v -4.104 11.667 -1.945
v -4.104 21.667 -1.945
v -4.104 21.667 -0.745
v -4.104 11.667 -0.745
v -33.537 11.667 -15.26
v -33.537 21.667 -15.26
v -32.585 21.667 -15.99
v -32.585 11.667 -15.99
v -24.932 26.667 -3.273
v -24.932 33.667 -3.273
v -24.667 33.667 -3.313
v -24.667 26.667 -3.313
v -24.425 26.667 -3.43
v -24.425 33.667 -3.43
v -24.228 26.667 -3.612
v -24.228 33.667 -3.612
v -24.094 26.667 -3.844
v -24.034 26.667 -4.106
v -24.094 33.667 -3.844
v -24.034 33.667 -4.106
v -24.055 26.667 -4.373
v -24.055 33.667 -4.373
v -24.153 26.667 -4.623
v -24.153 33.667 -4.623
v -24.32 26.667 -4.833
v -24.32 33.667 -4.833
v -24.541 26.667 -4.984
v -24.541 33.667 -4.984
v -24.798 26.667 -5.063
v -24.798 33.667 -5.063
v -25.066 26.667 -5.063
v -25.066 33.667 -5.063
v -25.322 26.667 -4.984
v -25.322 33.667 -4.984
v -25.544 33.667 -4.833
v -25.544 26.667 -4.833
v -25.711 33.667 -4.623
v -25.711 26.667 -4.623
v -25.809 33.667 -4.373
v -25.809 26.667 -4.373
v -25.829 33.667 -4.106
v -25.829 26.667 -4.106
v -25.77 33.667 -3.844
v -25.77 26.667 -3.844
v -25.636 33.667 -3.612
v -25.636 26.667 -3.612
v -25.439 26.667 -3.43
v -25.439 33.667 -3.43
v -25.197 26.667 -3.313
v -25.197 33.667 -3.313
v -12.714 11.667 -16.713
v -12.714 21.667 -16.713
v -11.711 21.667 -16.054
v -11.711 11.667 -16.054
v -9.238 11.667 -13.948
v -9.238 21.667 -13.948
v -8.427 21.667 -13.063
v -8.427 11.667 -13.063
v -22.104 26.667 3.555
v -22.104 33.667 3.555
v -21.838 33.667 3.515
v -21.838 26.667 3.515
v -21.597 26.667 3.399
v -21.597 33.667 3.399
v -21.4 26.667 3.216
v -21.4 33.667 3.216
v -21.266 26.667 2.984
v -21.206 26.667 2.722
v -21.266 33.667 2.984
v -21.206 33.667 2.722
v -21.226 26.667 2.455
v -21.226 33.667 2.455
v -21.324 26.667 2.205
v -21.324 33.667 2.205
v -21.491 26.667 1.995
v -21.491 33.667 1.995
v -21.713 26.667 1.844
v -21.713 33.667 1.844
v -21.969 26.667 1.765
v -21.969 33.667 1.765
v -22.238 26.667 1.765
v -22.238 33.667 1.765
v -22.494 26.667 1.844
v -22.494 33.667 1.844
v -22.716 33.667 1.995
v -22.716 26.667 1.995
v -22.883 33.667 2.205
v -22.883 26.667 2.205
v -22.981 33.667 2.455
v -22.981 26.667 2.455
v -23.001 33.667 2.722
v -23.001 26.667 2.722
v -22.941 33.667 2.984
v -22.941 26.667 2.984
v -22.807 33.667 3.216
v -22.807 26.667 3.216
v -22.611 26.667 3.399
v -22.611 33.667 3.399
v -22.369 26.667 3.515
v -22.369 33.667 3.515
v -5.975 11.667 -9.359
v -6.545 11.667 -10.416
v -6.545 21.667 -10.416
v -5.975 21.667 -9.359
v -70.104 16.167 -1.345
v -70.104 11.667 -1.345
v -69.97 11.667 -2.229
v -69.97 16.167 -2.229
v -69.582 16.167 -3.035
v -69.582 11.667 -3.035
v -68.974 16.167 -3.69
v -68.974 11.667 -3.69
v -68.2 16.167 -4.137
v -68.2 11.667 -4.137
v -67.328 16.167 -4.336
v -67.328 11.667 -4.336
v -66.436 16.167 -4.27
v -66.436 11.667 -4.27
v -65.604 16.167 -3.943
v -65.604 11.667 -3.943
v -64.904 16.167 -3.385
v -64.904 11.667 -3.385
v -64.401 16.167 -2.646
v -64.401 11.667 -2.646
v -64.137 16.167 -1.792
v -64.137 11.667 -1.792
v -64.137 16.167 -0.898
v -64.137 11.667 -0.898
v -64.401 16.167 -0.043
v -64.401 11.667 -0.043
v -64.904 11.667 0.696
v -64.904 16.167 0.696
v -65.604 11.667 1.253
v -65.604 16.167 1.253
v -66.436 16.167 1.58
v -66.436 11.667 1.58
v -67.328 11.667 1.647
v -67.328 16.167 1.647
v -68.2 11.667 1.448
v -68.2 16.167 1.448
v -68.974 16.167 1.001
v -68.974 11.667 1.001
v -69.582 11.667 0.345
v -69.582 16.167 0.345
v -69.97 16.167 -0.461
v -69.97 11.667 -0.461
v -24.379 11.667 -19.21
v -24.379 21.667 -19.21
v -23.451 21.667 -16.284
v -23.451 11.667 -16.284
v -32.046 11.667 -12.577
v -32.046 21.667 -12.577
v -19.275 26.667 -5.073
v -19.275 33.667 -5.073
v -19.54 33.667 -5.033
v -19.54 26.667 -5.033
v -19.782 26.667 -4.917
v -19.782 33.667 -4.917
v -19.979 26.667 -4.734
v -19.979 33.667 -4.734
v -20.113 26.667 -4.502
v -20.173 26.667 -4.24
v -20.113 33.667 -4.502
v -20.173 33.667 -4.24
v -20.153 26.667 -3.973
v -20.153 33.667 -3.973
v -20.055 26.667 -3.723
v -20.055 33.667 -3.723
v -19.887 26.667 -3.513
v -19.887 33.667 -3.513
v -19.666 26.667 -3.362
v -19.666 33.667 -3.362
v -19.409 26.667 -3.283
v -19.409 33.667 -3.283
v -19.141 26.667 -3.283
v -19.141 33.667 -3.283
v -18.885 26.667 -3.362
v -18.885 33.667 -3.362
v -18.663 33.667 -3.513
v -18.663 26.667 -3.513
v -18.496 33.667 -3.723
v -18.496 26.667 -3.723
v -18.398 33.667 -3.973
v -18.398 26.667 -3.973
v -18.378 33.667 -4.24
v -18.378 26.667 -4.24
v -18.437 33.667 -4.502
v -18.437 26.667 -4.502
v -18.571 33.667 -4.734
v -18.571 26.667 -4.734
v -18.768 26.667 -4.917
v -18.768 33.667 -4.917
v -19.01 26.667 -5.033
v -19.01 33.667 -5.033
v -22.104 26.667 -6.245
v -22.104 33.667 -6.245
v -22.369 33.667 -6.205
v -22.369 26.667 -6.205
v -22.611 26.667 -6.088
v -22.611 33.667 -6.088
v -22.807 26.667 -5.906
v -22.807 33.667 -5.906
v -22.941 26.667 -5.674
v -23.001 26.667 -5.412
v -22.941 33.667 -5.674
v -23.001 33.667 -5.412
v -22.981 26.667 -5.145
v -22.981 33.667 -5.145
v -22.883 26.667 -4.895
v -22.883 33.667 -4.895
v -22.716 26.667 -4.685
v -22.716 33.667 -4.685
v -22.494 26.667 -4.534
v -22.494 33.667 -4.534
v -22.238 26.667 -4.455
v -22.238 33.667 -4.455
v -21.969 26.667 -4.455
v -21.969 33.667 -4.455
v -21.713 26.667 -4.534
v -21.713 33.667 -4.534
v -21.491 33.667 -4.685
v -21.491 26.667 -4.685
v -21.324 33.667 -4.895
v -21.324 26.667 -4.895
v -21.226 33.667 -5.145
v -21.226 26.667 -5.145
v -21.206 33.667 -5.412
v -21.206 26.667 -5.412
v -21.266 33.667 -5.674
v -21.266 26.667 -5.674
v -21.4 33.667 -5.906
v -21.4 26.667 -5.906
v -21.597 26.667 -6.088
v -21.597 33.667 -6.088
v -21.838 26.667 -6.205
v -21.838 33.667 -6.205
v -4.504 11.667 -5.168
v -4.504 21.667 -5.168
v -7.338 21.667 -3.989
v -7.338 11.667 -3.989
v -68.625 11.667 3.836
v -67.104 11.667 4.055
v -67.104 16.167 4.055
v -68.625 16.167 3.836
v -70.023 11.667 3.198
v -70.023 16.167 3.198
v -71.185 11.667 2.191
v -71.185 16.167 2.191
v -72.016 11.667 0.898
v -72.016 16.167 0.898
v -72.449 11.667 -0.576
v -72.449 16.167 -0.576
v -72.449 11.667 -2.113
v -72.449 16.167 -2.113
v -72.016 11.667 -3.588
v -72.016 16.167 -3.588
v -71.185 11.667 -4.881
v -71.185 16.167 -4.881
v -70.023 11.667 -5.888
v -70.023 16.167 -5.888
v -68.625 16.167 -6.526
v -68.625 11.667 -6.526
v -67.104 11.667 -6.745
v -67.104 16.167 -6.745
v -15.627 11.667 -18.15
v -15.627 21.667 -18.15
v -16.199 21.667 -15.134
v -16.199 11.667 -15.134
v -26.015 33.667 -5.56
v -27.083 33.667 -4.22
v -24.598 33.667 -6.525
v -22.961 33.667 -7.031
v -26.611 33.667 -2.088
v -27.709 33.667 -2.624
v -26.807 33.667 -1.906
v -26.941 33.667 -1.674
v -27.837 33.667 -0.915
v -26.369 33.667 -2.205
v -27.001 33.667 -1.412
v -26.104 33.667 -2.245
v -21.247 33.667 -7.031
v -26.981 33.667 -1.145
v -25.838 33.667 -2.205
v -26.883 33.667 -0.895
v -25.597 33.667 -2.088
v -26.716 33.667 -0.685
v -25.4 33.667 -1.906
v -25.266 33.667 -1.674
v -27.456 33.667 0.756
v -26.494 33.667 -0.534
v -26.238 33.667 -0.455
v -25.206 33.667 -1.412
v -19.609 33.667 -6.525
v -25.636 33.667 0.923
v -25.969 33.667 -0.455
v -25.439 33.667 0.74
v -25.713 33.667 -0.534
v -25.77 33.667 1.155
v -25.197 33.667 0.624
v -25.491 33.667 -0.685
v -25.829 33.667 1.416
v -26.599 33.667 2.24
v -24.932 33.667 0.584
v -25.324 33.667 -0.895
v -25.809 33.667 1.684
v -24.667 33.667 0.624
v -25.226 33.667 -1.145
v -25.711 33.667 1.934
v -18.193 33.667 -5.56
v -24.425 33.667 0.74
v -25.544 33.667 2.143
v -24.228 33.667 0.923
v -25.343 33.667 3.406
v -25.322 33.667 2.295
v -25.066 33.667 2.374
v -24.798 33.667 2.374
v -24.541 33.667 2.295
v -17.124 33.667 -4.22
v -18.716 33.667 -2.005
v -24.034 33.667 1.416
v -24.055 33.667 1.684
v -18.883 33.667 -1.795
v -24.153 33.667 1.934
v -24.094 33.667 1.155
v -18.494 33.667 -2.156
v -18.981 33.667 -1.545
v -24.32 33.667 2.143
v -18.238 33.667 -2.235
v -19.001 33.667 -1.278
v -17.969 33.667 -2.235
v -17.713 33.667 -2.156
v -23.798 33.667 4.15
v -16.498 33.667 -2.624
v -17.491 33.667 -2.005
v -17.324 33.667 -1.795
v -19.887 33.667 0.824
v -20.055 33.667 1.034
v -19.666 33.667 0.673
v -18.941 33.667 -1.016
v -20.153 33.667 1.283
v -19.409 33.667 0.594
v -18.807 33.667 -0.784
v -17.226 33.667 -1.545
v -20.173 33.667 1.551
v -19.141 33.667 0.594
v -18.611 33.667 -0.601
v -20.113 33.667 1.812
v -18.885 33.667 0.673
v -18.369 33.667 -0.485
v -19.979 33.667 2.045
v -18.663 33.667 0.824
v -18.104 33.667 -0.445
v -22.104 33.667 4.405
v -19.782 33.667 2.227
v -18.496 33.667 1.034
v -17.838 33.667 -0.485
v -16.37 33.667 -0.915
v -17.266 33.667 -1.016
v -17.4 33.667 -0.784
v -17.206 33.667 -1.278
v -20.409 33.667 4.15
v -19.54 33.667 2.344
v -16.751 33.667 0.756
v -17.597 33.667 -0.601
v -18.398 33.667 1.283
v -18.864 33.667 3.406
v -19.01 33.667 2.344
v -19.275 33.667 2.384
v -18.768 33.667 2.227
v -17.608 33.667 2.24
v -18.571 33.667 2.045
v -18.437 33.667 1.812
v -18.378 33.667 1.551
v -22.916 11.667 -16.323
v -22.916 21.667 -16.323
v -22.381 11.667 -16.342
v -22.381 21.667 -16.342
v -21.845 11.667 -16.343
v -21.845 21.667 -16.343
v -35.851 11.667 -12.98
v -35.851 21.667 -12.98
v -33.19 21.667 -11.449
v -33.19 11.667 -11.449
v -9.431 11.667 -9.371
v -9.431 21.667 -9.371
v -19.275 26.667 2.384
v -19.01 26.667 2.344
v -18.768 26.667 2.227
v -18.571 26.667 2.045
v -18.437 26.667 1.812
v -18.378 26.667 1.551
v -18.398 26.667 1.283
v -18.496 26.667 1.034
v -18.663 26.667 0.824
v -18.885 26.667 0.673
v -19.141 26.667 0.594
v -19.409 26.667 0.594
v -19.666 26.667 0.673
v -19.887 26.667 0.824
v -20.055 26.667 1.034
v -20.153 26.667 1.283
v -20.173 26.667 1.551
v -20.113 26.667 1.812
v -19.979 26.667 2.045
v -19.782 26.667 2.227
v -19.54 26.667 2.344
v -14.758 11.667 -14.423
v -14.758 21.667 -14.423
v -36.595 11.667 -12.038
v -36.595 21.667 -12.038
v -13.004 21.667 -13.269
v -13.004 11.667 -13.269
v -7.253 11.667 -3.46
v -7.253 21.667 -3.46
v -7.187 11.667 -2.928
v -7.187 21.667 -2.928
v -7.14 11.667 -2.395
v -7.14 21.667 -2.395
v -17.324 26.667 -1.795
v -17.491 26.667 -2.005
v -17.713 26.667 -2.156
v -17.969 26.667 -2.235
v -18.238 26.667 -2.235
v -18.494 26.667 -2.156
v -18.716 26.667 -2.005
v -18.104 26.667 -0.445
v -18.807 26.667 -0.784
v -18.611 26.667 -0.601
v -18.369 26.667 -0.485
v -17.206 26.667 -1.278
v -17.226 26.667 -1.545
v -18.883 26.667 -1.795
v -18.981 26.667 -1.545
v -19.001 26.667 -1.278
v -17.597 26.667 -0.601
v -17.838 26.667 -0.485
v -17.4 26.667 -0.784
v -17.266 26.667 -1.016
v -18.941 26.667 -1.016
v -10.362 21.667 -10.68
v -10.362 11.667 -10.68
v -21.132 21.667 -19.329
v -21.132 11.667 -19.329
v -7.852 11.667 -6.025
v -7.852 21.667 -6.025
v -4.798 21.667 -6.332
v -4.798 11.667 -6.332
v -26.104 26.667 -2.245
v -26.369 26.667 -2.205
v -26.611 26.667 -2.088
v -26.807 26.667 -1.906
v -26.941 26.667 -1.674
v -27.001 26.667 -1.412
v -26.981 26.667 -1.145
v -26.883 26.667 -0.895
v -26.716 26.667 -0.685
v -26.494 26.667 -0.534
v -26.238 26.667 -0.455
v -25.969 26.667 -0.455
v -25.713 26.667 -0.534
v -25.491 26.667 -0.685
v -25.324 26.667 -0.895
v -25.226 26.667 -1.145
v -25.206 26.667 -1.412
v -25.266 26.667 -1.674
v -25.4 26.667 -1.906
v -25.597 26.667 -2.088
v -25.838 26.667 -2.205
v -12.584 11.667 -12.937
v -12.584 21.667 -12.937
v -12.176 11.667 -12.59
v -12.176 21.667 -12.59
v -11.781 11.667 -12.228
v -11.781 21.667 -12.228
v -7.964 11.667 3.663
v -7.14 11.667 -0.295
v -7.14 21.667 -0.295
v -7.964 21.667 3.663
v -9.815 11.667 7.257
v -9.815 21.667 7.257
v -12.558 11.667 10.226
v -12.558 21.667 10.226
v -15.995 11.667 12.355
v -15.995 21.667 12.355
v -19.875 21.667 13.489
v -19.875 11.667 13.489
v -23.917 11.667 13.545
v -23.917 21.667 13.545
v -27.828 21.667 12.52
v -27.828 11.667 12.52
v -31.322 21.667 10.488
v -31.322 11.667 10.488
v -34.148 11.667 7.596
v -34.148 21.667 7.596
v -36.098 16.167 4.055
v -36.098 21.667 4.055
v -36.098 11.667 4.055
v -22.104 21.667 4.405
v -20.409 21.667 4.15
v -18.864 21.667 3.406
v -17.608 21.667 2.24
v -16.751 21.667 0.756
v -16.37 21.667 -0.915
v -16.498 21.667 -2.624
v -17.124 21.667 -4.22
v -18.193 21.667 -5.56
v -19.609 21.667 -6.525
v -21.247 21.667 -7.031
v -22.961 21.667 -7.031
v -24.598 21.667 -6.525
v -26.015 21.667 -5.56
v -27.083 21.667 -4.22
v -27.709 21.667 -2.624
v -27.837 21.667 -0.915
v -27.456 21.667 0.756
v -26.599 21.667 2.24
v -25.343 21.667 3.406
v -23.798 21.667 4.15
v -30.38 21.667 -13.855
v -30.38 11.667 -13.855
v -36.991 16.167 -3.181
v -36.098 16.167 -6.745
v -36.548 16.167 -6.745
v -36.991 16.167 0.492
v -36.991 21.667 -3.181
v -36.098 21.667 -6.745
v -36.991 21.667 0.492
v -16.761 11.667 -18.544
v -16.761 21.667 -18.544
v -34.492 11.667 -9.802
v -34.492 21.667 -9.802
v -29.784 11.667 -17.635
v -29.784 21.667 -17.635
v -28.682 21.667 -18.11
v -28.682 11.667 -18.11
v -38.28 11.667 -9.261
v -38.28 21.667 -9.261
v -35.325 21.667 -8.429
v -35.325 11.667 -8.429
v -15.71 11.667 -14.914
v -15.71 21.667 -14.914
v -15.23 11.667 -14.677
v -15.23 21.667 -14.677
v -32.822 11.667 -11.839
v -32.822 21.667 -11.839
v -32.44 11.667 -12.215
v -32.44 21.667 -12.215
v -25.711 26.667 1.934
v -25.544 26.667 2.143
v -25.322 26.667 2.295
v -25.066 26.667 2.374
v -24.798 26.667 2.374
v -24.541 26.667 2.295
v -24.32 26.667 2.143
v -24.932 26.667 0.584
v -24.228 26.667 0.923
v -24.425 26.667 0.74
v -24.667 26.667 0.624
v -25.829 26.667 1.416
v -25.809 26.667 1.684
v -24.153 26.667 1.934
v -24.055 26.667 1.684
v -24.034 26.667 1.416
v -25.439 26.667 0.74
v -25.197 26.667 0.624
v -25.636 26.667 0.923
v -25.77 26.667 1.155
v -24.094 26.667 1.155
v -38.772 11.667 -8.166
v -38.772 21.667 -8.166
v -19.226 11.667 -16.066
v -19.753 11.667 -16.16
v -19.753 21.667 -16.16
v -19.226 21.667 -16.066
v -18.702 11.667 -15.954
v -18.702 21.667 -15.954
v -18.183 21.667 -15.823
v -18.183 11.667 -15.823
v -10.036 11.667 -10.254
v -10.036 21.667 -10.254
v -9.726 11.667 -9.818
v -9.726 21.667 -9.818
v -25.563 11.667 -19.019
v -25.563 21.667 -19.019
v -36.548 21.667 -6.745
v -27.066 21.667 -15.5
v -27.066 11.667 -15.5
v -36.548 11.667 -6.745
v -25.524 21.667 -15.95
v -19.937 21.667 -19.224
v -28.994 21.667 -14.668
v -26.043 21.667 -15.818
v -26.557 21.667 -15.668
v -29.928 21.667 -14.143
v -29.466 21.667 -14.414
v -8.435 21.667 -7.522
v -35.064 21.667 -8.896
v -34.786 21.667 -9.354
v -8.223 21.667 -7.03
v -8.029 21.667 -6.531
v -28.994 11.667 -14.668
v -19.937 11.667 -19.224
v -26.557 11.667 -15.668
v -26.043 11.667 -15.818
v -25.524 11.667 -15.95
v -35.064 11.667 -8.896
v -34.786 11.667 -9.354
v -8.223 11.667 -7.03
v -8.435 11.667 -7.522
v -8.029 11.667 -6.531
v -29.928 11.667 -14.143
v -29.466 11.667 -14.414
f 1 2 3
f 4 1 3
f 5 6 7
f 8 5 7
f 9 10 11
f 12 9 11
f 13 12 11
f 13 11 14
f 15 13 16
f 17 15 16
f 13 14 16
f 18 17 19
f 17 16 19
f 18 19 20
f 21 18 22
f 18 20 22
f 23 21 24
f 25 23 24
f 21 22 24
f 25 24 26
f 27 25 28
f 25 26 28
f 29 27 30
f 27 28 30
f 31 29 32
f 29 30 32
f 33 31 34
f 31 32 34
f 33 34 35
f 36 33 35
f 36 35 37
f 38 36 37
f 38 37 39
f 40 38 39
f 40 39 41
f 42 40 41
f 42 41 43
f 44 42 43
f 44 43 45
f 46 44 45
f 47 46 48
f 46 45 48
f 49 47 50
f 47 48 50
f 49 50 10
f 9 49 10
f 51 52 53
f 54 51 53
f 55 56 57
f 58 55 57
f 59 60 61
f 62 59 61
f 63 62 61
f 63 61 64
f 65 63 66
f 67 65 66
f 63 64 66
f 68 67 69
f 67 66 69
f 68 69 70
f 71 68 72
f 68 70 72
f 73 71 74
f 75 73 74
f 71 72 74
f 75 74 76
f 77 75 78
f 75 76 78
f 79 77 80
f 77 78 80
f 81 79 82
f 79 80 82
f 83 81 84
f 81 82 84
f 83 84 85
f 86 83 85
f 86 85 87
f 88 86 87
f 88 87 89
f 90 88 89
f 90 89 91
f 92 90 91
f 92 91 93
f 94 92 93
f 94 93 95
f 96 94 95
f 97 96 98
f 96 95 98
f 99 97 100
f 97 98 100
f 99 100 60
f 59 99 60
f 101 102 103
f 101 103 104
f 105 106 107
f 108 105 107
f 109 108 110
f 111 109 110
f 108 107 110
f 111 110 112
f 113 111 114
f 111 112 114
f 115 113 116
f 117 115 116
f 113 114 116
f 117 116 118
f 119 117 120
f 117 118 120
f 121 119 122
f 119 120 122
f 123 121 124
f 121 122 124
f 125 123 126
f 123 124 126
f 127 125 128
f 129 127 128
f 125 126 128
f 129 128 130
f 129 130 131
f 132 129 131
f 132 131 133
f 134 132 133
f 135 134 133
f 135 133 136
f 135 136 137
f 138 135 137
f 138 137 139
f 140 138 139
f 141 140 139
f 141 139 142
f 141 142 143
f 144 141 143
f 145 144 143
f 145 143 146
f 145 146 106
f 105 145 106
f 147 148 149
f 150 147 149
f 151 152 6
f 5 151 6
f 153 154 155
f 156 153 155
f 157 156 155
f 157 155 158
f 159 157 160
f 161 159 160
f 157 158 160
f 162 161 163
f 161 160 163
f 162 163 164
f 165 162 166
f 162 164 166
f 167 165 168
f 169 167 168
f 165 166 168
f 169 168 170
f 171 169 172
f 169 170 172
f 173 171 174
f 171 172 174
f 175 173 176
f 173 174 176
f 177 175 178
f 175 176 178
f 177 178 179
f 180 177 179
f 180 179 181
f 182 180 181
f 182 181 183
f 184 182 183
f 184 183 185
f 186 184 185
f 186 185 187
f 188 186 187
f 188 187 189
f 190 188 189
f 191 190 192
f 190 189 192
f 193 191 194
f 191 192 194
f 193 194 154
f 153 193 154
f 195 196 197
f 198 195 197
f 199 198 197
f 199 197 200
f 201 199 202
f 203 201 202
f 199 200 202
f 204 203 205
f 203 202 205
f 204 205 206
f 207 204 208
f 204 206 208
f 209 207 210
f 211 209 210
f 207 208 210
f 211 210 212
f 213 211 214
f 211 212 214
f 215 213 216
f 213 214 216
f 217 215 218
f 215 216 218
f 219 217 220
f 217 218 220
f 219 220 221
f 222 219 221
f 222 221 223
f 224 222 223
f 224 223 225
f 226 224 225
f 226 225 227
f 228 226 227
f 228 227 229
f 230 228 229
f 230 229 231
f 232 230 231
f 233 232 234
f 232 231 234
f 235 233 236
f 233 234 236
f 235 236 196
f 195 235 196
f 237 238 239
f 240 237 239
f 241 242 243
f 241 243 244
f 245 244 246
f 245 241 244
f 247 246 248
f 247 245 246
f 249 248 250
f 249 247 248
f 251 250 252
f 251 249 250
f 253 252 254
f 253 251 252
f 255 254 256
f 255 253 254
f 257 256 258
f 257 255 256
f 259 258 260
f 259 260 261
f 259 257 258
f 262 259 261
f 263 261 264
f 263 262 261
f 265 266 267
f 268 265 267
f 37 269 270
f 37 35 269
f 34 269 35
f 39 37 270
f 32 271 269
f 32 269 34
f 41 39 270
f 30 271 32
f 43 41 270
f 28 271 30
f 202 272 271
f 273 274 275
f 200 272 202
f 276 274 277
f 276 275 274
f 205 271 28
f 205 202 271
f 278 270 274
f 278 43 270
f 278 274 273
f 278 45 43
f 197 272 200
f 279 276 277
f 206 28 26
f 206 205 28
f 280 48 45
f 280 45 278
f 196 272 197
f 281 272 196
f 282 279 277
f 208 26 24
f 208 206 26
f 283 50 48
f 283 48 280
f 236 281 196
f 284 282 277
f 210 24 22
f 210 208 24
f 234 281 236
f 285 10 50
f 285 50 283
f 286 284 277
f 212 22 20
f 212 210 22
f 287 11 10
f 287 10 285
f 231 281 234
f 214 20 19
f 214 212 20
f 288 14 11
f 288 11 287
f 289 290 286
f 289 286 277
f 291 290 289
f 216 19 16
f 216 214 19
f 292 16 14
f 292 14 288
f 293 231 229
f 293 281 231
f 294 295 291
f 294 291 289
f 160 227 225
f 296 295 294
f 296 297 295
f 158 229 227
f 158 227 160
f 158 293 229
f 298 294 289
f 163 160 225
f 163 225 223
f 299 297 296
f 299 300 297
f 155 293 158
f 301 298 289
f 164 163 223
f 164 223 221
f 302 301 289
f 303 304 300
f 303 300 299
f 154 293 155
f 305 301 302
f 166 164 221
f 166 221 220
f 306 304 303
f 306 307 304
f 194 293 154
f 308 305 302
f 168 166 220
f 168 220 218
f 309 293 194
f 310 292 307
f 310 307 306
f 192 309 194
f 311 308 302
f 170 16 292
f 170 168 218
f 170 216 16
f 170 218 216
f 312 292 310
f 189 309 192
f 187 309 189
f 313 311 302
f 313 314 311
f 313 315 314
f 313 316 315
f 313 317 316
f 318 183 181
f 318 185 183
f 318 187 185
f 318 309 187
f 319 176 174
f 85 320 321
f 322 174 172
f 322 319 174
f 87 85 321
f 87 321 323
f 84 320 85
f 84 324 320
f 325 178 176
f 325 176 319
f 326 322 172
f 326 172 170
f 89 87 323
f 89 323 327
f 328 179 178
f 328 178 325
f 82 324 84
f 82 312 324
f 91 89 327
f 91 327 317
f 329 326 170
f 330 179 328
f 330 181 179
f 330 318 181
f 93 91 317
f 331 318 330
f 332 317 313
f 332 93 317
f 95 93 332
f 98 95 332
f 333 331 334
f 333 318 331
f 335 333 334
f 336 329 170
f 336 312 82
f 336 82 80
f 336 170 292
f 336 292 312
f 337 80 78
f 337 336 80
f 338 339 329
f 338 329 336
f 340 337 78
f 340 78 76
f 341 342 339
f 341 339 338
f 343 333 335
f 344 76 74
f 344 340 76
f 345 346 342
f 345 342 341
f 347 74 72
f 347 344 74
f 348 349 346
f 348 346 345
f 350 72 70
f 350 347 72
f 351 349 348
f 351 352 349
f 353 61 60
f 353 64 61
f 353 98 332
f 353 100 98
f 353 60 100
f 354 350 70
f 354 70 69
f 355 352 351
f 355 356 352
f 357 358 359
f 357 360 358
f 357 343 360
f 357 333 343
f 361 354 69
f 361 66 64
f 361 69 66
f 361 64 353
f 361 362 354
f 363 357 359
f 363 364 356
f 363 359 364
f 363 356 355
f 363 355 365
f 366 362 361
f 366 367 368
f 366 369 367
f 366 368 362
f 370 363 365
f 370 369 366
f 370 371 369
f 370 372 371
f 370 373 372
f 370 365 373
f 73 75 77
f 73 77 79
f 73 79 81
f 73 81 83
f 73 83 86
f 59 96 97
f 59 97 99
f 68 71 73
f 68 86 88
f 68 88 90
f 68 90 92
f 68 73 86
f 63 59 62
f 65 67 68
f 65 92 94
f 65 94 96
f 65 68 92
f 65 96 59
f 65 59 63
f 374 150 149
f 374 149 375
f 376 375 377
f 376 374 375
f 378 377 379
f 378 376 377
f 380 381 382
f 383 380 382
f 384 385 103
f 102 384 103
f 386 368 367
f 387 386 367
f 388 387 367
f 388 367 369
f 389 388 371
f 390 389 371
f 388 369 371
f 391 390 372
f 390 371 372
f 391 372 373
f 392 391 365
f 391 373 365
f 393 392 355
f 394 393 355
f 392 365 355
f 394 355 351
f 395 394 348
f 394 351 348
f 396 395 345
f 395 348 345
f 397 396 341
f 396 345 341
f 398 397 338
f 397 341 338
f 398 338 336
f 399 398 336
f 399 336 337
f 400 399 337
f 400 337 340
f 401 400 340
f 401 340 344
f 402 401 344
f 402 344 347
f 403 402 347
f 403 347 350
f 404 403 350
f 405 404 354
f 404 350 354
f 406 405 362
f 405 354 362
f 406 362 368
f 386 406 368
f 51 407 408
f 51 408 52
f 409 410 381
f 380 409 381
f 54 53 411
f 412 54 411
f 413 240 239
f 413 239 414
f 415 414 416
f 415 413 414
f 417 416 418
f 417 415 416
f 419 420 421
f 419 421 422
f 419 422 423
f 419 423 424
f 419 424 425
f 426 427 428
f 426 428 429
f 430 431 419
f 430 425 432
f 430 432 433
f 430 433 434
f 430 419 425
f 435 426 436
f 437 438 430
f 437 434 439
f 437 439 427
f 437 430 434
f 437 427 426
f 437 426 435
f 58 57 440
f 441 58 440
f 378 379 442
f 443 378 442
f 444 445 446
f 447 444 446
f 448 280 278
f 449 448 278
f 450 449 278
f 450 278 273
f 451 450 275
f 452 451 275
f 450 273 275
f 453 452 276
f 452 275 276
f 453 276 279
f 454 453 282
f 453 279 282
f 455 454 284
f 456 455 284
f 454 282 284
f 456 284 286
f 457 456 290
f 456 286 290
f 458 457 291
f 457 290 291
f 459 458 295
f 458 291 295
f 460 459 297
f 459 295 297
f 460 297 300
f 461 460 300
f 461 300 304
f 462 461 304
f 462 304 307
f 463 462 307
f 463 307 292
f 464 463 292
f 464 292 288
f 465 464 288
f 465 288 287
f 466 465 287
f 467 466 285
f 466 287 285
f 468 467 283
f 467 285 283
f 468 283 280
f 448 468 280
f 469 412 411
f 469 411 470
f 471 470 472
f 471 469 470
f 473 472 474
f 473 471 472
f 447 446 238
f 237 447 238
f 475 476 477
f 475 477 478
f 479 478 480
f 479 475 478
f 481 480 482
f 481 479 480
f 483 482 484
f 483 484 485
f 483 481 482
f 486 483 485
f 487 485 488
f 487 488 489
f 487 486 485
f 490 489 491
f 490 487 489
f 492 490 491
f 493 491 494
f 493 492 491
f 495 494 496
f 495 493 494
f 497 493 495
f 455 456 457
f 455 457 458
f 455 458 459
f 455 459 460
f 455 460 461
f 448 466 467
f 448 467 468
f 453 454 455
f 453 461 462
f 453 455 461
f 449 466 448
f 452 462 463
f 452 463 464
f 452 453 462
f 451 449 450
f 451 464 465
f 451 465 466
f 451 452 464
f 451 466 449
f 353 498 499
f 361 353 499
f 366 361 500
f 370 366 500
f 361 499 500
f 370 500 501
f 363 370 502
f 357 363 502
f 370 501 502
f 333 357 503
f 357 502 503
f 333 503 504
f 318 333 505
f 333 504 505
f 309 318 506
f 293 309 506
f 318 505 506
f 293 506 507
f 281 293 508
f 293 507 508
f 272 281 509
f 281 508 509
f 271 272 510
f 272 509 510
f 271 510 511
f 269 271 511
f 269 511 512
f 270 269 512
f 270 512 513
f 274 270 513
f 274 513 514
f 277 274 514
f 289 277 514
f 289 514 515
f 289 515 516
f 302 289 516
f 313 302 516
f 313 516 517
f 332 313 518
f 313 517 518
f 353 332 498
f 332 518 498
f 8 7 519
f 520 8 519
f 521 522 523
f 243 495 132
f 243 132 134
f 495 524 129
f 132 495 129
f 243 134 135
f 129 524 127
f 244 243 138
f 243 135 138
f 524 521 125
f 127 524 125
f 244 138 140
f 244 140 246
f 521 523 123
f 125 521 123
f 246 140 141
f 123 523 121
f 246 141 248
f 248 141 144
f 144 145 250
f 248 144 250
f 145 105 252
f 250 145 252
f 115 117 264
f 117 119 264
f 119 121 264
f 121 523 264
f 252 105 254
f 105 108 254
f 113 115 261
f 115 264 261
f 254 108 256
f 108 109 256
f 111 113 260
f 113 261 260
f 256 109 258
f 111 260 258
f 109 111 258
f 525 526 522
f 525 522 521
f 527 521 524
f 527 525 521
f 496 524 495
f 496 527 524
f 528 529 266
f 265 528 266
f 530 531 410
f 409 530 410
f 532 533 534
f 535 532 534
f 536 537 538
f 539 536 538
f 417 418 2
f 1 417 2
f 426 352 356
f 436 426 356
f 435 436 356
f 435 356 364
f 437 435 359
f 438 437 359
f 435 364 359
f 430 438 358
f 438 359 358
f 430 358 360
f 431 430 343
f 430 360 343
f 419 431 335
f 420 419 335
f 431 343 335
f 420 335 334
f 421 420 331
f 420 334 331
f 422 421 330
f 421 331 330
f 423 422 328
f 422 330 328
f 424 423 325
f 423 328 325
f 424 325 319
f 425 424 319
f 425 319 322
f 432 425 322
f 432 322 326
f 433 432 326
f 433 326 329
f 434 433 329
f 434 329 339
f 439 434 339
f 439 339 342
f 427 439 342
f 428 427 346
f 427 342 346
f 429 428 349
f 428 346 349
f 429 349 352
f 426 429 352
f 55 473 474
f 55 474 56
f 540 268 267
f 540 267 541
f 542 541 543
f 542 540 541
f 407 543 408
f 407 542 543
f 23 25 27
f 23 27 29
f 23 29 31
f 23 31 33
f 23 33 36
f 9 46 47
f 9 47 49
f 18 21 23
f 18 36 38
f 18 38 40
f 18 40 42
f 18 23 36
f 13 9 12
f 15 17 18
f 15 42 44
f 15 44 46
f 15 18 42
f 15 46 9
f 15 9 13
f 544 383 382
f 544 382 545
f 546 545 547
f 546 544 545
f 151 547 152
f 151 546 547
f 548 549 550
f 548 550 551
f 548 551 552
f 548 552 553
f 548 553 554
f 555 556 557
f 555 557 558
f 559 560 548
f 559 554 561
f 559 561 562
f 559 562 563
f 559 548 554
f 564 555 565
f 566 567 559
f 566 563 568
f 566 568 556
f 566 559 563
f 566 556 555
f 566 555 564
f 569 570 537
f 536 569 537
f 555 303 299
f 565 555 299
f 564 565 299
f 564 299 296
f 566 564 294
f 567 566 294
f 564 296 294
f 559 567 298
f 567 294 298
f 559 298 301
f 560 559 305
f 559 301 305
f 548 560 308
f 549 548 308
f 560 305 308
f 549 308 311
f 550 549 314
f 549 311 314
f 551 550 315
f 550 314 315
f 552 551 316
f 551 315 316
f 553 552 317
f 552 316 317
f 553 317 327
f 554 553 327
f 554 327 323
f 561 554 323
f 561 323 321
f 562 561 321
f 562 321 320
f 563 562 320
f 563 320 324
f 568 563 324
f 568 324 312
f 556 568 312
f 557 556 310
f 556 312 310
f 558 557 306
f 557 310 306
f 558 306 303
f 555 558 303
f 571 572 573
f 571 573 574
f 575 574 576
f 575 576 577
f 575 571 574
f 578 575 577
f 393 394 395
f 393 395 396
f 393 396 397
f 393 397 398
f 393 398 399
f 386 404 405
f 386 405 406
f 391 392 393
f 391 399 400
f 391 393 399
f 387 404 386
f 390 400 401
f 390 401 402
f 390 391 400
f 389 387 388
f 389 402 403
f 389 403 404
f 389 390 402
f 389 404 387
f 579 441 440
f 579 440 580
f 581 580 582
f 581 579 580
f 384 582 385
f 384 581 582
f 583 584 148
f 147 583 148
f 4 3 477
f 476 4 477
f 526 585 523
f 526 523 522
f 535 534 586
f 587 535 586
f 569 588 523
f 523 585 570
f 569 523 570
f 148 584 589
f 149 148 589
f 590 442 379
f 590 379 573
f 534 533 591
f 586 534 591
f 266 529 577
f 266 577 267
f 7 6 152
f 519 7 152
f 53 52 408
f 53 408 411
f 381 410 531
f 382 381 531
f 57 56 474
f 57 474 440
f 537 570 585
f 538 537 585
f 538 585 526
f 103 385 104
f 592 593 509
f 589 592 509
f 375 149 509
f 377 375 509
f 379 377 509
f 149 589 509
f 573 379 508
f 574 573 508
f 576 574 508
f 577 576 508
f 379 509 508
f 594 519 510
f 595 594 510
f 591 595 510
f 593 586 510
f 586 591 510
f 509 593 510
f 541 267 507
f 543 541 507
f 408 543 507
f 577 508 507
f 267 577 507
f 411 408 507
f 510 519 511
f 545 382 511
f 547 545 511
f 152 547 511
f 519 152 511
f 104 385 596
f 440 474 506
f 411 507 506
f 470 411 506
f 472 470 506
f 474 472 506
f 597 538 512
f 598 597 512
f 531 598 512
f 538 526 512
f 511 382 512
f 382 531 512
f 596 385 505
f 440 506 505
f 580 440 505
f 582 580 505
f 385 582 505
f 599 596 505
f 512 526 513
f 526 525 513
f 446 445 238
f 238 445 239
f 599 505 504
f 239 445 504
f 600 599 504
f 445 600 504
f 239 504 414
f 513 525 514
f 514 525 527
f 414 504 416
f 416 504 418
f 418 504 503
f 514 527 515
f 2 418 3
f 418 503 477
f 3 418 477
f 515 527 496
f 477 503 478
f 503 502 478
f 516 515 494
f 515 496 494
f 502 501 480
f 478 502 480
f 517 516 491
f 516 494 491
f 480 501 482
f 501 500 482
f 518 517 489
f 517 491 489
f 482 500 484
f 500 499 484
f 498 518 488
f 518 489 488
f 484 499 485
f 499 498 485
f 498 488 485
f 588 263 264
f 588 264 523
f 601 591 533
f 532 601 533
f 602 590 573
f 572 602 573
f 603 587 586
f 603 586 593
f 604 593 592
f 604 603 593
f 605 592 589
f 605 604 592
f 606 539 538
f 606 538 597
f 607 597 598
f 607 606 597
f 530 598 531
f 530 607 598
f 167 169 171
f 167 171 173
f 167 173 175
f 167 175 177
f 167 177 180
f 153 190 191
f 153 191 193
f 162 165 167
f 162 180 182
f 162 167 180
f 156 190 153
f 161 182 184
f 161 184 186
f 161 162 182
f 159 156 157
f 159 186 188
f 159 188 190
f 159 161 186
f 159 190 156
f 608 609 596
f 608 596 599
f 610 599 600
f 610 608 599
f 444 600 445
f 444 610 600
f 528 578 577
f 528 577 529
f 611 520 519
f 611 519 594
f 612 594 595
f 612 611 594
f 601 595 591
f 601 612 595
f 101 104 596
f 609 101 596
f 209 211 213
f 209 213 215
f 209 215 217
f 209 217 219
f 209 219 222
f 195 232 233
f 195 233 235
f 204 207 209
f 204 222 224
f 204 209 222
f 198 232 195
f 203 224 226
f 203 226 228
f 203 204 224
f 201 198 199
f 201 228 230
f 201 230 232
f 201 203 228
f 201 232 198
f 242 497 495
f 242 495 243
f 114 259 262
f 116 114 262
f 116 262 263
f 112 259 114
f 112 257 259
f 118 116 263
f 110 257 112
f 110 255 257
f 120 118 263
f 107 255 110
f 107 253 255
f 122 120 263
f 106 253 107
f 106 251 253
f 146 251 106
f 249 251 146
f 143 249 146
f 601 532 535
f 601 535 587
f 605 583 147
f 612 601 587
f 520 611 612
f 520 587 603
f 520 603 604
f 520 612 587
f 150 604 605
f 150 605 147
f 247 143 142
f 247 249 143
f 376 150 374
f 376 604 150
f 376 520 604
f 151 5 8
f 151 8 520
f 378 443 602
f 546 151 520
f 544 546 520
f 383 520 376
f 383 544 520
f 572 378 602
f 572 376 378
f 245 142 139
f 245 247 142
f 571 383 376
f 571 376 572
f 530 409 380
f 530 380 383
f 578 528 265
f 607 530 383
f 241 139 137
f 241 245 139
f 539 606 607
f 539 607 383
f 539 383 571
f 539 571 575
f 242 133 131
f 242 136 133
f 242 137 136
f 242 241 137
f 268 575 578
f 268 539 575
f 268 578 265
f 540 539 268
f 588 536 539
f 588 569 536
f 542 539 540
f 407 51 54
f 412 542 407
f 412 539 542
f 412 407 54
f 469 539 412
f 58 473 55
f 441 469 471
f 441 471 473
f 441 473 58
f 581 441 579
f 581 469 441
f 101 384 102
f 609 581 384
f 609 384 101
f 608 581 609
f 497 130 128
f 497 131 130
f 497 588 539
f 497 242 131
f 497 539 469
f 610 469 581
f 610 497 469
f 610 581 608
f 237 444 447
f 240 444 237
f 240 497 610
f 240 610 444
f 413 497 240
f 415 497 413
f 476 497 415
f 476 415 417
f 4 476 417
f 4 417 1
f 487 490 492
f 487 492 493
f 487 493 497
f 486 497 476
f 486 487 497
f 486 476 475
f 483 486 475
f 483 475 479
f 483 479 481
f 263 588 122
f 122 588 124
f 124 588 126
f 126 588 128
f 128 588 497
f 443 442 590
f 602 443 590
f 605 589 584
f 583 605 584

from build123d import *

# Parameters (mm, degrees)
BOSS_EXTRUDE1_DEPTH = 33.333333333
BOSS_EXTRUDE2_DEPTH = 33.333333333
CIRPATTERN2_COUNT   = 13
CIRPATTERN2_ANGLE   = 170
F_20_0MM_1_D        = 20
SCALE_1_SCALE       = 0.3
CUT_EXTRUDE_1_DEPTH = 5.5
SKETCH_2_R          = 5.75
EXTRUDE_1_DEPTH     = 12
SKETCH_3_R          = 0.9
CUT_EXTRUDE_2_DEPTH = 7


with BuildPart() as part:
    # Sketch1 → Boss-Extrude1 (new body)
    with BuildSketch(Plane(origin=(0, 0, 0), x_dir=(1, 0, 0), z_dir=(0, 1, 0))):
        with BuildLine():
            Line((-150, 18), (-46.647615159, 18))
            ThreePointArc((-46.647615159, 18), (50, 0), (-46.647615159, -18))
            Line((-46.647615159, -18), (-150, -18))
            ThreePointArc((-150, -18), (-168, 0), (-150, 18))
        make_face()
    extrude(amount=BOSS_EXTRUDE1_DEPTH)

    # Sketch2 → Boss-Extrude2 (add)
    with BuildSketch(Plane(origin=(0, 33.333333333, 0), x_dir=(1, 0, 0), z_dir=(0, 1, 0))):
        Polygon((49.877349569, 3.5), (60, 2), (60, -2), (49.877349569, -3.5), (50, 0), align=None)
    boss_extrude2 = extrude(amount=-BOSS_EXTRUDE2_DEPTH)

    # CirPattern2: Boss-Extrude2 ×13 about axis
    cirpattern2_axis = Axis((0, 0, 0), (0, 1, 0))
    for i in range(1, CIRPATTERN2_COUNT):
        add(boss_extrude2.rotate(cirpattern2_axis, i * CIRPATTERN2_ANGLE / (CIRPATTERN2_COUNT - 1)))

    # Ø20.0mm 맞춤핀 구멍1 (through all)
    with Locations(Plane(origin=(0, 33.333333333, 0), x_dir=(1, 0, 0), z_dir=(0, 1, 0))):
        with Locations((-150, 0)):
            Hole(F_20_0MM_1_D / 2)


with BuildPart() as part_1:
    # 축척1: scaled about (-31.576481157, 16.666666667, -1.921113945)
    add(part.part.scale(SCALE_1_SCALE).moved(Location((-22.10353681, 11.666666667, -1.344779761))))

    # 스케치1 → 컷-돌출1 (cut)
    with BuildSketch(Plane(origin=(0, 21.666666667, 0), x_dir=(1, 0, 0), z_dir=(0, 1, 0))):
        with BuildLine():
            Line((-36.097821358, -4.055220239), (-67.10353681, -4.055220239))
            ThreePointArc((-67.10353681, -4.055220239), (-72.50353681, 1.344779761), (-67.10353681, 6.744779761))
            Line((-67.10353681, 6.744779761), (-36.097821358, 6.744779761))
            ThreePointArc((-36.097821358, 6.744779761), (-37.10353681, 1.344779761), (-36.097821358, -4.055220239))
        make_face()
    extrude(amount=-CUT_EXTRUDE_1_DEPTH, mode=Mode.SUBTRACT)

    # 스케치2 → 보스-돌출1 (add)
    with BuildSketch(Plane(origin=(0, 21.666666667, 0), x_dir=(1, 0, 0), z_dir=(0, 1, 0))):
        with Locations(Location((-22.10353681, 1.344779761, 0), (0, 0, 270))):
            Circle(SKETCH_2_R)
    extrude(amount=EXTRUDE_1_DEPTH)

    # 스케치3 → 컷-돌출2 (cut)
    with BuildSketch(Plane(origin=(0, 33.666666667, 0), x_dir=(1, 0, 0), z_dir=(0, 1, 0))):
        with Locations(Location((-22.10353681, -2.655220239, 0), (0, 0, 270))):
            Circle(SKETCH_3_R)
        with Locations(Location((-19.275109685, -1.483647363, 0), (0, 0, 270))):
            Circle(SKETCH_3_R)
        with Locations(Location((-18.10353681, 1.344779761, 0), (0, 0, 270))):
            Circle(SKETCH_3_R)
        with Locations(Location((-24.931963935, -1.483647363, 0), (0, 0, 90))):
            Circle(SKETCH_3_R)
        with Locations(Location((-26.10353681, 1.344779761, 0), (0, 0, 90))):
            Circle(SKETCH_3_R)
        with Locations(Location((-24.931963935, 4.173206886, 0), (0, 0, 270))):
            Circle(SKETCH_3_R)
        with Locations(Location((-22.10353681, 5.344779761, 0), (0, 0, 90))):
            Circle(SKETCH_3_R)
        with Locations(Location((-19.275109685, 4.173206886, 0), (0, 0, 90))):
            Circle(SKETCH_3_R)
    extrude(amount=-CUT_EXTRUDE_2_DEPTH, mode=Mode.SUBTRACT)


solid = part_1.part
